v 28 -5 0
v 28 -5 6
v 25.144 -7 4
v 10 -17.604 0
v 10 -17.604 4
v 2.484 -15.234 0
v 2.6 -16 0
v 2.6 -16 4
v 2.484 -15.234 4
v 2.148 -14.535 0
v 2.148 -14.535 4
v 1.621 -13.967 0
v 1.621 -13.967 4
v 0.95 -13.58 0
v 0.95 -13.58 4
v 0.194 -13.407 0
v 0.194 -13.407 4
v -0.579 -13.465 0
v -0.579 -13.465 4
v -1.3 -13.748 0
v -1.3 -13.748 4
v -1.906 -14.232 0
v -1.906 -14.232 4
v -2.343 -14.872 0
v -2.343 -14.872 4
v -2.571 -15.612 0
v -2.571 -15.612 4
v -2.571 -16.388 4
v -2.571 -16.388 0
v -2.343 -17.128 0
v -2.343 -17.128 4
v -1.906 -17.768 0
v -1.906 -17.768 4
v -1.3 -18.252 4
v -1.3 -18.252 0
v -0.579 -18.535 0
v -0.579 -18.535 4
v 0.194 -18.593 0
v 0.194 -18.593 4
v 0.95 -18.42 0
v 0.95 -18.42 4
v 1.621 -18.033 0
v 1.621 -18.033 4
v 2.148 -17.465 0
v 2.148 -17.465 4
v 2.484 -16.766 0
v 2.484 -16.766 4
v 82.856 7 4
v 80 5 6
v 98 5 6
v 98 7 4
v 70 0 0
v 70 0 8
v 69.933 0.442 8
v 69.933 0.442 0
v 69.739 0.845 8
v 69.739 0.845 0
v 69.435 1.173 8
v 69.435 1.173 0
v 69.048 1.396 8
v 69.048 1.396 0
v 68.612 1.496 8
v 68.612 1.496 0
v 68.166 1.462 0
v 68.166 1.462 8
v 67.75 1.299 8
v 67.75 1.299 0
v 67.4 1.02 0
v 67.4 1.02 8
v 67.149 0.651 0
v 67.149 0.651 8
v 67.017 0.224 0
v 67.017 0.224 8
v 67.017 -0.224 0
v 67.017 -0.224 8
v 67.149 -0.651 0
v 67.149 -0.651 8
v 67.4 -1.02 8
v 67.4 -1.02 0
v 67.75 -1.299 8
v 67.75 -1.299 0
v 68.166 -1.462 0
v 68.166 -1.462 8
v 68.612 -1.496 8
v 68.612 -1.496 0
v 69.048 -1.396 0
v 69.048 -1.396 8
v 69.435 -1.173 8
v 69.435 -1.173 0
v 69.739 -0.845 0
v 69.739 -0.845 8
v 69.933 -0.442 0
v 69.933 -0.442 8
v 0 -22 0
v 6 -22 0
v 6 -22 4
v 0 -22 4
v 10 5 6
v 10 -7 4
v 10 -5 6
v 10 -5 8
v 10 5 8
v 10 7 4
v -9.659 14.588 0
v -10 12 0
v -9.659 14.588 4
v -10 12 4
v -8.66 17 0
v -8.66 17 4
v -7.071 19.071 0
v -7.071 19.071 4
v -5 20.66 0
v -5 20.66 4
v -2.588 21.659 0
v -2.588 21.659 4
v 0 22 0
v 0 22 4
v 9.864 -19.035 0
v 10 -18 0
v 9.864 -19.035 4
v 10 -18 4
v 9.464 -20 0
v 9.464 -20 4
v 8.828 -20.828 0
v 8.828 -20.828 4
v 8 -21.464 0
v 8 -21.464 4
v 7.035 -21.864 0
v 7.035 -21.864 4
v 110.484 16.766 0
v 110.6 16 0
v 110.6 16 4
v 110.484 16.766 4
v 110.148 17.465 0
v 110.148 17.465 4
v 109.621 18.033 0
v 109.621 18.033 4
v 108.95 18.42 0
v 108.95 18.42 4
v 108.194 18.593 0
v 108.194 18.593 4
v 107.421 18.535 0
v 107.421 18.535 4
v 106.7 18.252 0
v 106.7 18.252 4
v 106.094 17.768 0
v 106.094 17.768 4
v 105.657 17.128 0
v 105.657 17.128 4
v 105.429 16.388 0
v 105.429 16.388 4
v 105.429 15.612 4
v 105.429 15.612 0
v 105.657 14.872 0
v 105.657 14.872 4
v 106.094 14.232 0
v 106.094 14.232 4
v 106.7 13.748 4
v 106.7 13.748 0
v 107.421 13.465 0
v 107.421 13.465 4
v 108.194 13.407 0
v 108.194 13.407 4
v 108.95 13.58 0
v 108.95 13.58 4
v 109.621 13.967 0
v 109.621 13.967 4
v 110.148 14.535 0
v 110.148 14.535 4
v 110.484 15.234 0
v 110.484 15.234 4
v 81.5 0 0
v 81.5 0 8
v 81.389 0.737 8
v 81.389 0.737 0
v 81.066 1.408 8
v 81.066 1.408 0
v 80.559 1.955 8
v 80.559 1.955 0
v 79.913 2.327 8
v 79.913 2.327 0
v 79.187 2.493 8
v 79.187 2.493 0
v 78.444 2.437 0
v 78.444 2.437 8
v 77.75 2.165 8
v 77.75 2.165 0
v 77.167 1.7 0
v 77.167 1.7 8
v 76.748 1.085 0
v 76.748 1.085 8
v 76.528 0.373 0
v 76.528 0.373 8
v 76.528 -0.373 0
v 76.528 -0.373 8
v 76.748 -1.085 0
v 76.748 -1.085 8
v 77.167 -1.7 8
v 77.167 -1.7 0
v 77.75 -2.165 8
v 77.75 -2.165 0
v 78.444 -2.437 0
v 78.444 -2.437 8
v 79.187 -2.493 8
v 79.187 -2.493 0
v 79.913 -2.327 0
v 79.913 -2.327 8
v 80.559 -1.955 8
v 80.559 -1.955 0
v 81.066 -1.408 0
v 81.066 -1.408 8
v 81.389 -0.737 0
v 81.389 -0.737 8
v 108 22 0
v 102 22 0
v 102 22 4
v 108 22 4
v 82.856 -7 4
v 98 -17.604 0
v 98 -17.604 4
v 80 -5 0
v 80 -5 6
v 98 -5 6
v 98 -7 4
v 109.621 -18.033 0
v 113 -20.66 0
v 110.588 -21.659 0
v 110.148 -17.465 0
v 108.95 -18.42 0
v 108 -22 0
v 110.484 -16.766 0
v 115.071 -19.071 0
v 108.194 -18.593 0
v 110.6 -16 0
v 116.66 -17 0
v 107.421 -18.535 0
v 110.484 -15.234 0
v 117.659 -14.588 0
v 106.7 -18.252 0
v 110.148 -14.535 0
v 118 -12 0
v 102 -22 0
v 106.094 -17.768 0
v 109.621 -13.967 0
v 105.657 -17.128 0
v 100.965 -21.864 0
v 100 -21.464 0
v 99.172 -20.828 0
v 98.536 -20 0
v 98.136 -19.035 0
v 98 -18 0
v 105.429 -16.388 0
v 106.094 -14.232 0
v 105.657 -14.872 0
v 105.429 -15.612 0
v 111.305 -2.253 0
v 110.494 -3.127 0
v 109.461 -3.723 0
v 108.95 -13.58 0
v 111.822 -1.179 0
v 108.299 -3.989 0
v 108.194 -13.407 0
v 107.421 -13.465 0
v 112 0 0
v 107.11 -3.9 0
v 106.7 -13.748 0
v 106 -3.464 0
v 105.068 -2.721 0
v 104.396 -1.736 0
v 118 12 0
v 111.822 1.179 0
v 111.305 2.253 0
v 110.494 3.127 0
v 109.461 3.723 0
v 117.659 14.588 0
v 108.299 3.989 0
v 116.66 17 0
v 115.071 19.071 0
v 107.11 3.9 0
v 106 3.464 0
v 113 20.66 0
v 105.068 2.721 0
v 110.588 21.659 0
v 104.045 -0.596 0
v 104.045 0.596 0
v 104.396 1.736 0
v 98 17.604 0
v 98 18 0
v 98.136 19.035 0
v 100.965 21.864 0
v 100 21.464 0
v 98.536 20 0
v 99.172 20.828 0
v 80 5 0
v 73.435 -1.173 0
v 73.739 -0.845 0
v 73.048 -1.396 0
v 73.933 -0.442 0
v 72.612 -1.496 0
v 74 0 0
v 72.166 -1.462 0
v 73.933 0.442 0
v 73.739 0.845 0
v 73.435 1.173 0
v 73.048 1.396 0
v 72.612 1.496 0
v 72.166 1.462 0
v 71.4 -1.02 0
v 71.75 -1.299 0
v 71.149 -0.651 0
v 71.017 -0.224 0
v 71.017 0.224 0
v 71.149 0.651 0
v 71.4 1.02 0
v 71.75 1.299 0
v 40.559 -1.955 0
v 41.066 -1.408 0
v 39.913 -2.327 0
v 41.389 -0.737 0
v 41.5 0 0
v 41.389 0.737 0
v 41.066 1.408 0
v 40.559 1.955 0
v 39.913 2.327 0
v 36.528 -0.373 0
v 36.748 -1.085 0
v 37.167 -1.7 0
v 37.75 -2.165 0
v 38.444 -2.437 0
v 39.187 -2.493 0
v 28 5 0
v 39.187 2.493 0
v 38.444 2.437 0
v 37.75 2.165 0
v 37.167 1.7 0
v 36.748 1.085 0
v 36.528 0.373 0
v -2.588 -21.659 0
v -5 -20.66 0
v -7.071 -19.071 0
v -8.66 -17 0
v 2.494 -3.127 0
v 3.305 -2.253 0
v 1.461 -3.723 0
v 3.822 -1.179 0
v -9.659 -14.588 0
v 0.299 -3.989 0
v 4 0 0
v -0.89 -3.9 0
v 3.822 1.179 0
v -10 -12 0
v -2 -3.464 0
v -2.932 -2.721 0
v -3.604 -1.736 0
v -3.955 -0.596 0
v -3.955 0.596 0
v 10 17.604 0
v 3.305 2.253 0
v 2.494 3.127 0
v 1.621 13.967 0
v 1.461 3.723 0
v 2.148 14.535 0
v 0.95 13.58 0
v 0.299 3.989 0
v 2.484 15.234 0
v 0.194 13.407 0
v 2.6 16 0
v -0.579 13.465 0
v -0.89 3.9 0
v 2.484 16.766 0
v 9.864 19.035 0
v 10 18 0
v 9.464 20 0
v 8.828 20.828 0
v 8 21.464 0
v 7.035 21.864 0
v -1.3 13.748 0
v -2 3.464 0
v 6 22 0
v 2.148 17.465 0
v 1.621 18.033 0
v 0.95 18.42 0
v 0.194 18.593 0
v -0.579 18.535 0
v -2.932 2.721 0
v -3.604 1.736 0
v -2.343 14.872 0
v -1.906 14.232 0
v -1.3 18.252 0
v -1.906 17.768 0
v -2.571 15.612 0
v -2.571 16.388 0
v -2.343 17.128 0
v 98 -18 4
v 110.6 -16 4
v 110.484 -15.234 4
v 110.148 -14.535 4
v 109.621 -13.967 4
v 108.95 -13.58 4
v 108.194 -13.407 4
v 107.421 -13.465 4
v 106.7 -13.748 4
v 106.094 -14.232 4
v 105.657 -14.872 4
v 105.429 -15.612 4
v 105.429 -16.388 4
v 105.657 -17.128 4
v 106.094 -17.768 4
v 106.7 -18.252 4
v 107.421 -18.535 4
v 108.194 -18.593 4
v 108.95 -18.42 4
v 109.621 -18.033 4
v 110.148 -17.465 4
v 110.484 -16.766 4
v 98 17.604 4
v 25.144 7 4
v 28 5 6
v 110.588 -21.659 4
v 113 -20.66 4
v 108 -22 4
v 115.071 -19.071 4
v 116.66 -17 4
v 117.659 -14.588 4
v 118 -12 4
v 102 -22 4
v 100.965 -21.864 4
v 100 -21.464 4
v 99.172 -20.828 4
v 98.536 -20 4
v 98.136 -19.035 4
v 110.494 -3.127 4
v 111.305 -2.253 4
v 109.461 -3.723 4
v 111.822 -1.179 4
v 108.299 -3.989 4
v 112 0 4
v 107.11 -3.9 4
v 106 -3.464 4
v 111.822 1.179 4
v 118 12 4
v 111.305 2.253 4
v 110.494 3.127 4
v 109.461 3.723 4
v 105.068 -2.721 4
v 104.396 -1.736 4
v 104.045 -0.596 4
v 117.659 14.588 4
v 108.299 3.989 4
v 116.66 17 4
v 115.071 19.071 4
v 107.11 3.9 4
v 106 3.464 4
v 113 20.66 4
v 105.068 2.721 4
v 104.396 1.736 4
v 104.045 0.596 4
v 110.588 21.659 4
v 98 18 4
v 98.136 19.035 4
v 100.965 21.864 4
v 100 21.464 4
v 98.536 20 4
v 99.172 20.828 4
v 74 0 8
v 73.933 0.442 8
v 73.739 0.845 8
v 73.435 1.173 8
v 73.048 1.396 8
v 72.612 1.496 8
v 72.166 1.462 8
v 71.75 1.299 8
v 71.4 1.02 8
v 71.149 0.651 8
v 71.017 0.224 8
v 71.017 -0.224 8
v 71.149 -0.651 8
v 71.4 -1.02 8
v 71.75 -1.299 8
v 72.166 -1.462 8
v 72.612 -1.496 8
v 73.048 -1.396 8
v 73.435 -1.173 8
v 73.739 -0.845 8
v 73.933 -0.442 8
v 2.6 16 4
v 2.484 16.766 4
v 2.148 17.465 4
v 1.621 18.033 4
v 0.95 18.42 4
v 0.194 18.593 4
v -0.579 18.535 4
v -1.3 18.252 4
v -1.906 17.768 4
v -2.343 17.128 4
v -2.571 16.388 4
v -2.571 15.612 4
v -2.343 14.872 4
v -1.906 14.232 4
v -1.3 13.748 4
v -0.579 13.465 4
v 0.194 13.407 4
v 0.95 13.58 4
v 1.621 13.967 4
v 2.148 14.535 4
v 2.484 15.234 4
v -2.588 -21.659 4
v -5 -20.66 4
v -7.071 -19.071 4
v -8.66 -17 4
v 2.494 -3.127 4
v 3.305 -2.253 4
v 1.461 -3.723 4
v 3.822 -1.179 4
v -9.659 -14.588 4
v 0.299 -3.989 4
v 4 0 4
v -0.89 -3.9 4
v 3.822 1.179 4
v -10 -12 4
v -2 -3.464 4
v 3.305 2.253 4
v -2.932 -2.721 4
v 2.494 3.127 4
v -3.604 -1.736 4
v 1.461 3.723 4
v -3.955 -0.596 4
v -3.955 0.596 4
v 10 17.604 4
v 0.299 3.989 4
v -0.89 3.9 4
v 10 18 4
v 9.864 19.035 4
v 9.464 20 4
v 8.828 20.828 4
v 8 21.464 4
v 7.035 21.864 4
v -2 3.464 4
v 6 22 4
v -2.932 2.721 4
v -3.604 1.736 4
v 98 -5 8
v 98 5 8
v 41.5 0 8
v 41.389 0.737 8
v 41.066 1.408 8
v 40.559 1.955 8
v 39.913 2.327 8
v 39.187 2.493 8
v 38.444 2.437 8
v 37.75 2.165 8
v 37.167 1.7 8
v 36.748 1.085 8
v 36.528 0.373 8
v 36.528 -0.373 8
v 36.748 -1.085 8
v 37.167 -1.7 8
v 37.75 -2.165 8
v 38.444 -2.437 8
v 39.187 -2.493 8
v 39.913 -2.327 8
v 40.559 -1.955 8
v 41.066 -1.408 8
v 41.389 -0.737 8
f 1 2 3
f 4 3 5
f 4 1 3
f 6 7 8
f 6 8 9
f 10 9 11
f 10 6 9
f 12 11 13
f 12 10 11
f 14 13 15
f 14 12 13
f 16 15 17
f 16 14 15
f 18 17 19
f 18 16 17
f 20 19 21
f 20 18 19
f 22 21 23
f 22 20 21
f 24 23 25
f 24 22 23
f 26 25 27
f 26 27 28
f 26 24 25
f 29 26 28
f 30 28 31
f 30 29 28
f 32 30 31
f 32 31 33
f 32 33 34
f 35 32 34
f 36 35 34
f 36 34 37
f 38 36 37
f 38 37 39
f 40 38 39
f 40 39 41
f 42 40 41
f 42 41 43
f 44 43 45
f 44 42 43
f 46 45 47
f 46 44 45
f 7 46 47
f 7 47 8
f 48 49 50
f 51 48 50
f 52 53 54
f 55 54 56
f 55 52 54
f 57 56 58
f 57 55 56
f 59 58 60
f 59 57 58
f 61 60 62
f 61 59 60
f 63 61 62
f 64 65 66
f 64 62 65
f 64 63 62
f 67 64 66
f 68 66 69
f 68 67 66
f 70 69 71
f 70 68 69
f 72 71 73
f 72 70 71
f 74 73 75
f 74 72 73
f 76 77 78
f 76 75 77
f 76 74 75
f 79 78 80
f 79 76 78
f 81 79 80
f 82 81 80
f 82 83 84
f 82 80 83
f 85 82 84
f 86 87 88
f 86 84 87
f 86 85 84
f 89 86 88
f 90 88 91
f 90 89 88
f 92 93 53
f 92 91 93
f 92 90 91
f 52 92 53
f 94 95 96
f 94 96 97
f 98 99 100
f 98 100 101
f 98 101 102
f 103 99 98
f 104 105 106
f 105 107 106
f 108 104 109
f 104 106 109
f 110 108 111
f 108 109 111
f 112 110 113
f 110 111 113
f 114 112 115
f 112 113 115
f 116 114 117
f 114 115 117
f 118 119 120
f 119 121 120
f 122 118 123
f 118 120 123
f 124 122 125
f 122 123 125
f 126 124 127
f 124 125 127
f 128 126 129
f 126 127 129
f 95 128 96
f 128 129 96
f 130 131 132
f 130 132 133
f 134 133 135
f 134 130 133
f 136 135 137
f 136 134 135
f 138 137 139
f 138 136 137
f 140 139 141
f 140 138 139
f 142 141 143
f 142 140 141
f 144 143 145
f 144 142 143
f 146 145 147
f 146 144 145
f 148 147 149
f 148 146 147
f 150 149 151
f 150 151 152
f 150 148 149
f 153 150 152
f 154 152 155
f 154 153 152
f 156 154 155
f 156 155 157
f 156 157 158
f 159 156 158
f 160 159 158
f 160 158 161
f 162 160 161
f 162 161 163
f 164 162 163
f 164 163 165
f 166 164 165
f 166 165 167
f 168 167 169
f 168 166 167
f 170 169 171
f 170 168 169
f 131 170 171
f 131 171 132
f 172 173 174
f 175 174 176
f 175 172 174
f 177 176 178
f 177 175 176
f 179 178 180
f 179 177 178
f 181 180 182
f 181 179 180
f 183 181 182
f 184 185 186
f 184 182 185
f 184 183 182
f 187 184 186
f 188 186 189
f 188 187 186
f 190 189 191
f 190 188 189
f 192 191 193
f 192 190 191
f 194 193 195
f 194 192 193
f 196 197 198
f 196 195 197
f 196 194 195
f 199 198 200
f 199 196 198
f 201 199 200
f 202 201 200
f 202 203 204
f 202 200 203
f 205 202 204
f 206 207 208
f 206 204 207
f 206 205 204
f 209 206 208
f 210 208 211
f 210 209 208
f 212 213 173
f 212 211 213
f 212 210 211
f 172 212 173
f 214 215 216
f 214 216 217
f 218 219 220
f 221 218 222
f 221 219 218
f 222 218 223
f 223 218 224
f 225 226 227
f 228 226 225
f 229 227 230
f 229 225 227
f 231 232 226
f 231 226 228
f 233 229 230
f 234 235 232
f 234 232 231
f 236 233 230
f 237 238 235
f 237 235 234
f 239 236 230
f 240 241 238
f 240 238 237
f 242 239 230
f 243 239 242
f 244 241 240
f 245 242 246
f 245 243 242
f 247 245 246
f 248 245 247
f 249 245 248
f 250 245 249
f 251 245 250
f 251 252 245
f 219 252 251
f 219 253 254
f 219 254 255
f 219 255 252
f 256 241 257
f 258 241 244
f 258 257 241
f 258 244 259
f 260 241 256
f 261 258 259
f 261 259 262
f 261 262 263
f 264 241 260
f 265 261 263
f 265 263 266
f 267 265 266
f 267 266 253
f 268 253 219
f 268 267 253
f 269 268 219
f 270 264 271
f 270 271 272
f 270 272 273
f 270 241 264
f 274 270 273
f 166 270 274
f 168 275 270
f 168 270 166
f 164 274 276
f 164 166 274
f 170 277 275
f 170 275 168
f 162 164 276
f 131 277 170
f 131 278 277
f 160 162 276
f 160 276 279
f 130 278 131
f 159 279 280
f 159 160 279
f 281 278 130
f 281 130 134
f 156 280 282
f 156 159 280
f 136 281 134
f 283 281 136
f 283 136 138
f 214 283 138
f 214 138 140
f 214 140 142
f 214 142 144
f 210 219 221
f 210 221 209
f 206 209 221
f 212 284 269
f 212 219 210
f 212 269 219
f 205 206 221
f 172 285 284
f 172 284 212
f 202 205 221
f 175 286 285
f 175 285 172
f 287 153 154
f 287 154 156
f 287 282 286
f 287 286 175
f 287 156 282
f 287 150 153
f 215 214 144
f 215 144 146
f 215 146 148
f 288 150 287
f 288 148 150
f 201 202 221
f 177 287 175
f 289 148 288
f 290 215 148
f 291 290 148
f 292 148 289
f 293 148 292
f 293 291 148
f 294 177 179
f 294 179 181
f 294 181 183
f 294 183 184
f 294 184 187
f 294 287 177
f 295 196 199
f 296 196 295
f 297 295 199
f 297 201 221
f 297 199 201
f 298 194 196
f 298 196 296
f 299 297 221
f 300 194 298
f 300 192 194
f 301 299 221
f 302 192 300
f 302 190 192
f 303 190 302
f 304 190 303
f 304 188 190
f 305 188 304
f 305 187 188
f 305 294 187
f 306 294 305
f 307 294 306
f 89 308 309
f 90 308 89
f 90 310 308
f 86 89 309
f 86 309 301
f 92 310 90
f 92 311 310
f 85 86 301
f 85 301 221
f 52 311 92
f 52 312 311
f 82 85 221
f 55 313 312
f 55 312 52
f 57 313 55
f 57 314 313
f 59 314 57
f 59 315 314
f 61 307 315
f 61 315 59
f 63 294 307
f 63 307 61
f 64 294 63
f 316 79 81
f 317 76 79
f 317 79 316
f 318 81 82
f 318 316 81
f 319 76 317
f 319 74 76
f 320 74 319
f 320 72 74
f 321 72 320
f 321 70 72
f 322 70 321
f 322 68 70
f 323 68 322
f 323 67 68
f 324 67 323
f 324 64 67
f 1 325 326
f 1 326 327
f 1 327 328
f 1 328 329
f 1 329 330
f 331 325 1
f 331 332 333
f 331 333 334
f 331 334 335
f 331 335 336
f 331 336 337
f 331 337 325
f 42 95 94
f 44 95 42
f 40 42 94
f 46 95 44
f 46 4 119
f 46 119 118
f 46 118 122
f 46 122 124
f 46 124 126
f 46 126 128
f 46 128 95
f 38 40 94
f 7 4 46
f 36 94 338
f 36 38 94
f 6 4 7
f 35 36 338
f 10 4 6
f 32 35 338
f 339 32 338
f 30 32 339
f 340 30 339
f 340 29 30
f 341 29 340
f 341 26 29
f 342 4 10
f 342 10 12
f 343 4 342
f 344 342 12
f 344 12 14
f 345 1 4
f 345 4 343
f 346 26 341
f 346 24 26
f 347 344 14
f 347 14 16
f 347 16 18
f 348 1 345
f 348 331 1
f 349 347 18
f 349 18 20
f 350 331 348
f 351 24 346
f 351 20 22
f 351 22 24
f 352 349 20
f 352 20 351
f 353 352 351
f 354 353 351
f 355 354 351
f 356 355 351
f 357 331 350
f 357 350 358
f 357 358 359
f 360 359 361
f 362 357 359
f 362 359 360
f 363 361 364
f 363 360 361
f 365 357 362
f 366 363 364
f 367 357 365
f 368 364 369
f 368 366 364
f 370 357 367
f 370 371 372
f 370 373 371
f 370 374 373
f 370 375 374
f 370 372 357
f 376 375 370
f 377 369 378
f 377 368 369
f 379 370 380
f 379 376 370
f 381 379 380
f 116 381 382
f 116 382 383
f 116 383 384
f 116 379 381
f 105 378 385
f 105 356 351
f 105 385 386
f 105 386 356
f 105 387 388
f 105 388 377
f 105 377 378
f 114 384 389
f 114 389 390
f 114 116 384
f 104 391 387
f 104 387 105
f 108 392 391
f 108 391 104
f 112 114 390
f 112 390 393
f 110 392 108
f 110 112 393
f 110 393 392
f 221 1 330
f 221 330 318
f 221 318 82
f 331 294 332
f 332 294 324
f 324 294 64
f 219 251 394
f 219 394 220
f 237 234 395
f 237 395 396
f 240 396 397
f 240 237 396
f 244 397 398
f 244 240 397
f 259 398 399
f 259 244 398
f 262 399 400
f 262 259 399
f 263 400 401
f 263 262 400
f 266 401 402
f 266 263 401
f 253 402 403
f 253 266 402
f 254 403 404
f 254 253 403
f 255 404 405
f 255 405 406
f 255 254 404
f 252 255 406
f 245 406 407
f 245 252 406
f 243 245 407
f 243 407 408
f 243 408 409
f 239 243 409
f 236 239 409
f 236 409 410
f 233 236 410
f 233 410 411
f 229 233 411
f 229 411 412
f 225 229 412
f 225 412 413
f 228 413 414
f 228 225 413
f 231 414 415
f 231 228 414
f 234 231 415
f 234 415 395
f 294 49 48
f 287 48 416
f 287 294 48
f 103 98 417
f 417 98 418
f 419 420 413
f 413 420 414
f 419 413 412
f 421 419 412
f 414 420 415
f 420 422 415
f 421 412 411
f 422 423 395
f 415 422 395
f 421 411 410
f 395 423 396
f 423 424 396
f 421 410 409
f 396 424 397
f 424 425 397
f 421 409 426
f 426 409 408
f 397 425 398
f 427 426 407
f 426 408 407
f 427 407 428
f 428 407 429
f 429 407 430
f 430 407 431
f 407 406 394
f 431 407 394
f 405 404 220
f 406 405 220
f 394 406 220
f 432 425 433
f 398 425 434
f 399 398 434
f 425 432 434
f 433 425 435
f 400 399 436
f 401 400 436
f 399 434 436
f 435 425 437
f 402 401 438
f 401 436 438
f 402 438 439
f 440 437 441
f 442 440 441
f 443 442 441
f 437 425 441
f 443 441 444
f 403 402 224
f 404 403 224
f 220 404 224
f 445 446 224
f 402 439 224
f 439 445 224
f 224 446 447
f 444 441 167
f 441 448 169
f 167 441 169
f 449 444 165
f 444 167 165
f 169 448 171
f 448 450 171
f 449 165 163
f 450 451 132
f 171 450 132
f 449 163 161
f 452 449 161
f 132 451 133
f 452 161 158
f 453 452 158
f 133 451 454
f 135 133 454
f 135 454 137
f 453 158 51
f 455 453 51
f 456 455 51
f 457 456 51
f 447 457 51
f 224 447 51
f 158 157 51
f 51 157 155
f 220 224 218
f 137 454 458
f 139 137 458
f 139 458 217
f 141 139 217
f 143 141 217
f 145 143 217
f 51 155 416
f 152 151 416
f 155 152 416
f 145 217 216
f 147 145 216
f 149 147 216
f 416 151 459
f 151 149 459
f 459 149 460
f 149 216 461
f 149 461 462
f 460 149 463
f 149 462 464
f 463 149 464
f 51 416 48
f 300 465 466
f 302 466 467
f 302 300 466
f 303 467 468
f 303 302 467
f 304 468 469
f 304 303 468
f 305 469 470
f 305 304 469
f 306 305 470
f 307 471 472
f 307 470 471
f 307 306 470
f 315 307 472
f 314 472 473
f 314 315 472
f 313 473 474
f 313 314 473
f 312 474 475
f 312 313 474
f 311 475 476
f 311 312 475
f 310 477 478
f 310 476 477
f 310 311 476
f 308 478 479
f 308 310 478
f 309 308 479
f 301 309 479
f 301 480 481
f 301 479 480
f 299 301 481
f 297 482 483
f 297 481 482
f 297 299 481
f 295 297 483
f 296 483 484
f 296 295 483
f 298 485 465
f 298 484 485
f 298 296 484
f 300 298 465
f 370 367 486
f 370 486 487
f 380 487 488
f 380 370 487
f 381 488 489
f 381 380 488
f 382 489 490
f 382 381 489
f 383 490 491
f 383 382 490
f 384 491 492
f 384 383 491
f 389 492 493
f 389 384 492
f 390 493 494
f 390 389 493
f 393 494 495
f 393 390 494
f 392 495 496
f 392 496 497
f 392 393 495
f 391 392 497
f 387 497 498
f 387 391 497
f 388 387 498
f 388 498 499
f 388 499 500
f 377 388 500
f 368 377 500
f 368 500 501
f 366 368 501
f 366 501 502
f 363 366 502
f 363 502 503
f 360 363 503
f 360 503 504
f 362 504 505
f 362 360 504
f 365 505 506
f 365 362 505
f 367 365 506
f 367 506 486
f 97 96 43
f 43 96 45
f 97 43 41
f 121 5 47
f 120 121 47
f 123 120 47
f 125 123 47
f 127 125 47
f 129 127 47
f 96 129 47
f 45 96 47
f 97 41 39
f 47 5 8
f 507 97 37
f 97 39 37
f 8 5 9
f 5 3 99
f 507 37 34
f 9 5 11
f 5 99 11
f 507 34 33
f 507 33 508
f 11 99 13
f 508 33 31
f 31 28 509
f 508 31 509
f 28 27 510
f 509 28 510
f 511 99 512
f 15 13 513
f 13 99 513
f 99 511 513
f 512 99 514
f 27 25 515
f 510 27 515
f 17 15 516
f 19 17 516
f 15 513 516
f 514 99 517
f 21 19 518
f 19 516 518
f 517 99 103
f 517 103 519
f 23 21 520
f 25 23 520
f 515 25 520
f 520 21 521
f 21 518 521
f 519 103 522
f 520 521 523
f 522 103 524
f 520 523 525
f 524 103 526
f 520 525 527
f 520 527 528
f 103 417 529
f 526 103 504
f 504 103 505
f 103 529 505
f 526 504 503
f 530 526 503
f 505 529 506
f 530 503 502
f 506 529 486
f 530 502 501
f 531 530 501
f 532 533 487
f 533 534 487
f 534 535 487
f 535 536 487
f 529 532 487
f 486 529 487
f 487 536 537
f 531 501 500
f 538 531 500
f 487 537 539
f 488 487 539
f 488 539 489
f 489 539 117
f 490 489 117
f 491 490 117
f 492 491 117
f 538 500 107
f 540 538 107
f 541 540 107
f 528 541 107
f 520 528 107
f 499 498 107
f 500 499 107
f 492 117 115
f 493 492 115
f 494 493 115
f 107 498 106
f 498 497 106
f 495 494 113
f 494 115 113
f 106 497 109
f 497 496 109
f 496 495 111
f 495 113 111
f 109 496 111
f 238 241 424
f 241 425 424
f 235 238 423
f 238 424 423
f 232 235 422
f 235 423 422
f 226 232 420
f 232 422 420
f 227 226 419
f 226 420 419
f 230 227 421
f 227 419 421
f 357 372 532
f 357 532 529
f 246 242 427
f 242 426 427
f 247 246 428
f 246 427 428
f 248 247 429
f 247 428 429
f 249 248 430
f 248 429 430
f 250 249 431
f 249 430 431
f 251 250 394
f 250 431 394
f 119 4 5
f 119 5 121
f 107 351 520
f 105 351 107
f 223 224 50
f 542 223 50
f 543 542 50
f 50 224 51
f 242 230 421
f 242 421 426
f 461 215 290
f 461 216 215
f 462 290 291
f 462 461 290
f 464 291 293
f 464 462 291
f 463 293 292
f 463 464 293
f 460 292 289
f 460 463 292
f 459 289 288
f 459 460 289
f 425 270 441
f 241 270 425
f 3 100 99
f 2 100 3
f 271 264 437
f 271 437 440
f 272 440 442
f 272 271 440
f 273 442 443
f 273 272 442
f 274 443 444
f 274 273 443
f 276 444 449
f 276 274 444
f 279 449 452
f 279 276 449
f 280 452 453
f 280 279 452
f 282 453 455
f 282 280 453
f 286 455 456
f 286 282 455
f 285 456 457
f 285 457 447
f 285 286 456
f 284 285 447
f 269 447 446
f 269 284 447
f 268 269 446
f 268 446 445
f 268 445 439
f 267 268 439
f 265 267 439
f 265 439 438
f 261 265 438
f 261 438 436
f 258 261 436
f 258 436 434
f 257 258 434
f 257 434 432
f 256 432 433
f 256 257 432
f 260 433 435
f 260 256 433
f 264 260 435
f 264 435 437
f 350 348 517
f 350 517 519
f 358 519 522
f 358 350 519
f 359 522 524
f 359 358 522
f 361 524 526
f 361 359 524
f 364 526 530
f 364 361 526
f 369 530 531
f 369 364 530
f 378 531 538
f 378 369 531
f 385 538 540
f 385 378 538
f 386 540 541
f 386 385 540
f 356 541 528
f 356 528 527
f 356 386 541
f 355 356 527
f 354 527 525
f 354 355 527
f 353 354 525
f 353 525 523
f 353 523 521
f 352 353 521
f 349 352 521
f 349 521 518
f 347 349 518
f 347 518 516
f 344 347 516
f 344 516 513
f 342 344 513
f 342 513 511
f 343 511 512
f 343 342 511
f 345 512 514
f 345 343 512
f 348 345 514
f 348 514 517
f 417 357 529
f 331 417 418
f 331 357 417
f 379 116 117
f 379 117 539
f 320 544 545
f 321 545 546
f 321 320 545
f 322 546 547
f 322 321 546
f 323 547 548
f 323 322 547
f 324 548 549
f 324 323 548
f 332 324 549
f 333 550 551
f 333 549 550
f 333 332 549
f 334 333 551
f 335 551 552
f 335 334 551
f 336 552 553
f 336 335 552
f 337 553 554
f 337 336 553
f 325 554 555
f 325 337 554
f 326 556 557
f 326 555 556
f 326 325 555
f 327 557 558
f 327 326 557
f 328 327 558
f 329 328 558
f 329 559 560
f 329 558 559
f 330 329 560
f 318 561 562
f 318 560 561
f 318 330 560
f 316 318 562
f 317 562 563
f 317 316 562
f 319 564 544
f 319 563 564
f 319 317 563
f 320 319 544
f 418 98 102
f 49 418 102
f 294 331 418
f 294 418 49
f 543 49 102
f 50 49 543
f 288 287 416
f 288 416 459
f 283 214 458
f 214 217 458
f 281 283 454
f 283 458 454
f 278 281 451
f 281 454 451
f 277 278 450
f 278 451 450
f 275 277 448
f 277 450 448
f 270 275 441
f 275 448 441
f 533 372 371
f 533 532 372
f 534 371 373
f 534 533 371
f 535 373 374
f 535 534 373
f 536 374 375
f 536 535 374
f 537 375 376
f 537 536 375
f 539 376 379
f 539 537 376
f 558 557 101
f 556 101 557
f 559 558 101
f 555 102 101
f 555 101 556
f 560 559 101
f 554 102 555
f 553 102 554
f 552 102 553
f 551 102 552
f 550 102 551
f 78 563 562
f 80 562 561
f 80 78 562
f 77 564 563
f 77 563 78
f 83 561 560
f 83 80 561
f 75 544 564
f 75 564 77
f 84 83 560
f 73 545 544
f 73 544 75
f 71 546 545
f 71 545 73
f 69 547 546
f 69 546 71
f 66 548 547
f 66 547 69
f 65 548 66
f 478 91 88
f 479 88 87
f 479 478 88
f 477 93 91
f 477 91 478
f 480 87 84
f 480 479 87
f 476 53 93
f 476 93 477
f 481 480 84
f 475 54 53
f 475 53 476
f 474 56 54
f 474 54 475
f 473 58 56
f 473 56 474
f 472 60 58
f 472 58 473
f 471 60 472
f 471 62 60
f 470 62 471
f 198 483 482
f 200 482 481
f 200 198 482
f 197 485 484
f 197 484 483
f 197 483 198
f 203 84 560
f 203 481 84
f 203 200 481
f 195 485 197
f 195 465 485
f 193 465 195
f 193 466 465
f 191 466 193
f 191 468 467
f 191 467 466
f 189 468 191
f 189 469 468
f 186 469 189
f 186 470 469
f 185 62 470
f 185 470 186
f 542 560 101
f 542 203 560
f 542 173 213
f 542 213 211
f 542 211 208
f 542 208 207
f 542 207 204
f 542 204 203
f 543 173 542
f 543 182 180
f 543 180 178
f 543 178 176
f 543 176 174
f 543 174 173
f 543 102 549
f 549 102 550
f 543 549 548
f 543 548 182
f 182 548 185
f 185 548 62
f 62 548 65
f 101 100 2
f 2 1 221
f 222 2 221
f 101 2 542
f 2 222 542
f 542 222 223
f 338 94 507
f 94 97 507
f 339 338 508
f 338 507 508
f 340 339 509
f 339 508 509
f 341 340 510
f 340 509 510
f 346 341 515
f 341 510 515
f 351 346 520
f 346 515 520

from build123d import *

# Parameters (mm, degrees)
SKETCH_R        = 4
SKETCH_R_2      = 2.5
SKETCH_R_3      = 1.5
SKETCH_R_4      = 2.6
PAD_DEPTH       = 4
SKETCH006_W     = 88
SKETCH006_H     = 10
PAD001_DEPTH    = 4
SKETCH007_R     = 2.5
SKETCH007_R_2   = 1.5
POCKET_DEPTH    = 8.001
FILLET_R        = 10
FILLET001_R     = 10
FILLET002_R     = 4
FILLET003_R     = 4
CHAMFER_SIZE    = 2
CHAMFER001_SIZE = 2
CHAMFER002_SIZE = 2


with BuildPart() as part:
    # Sketch → Pad (new body)
    with BuildSketch(Plane.XY):
        Polygon((80, 5), (98, 17.603736), (98, 22), (118, 22), (118, -22), (98, -22), (98, -17.603736), (80, -5), (28, -5), (10, -17.603736), (10, -22), (-10, -22), (-10, 22), (10, 22), (10, 17.603736), (28, 5), align=None)
        with Locations((108, 0)):
            Circle(SKETCH_R, mode=Mode.SUBTRACT)
        with Locations((39, 0)):
            Circle(SKETCH_R_2, mode=Mode.SUBTRACT)
        with Locations((79, 0)):
            Circle(SKETCH_R_2, mode=Mode.SUBTRACT)
        with Locations((72.5, 0)):
            Circle(SKETCH_R_3, mode=Mode.SUBTRACT)
        with Locations((68.5, 0)):
            Circle(SKETCH_R_3, mode=Mode.SUBTRACT)
        with Locations((108, 16)):
            Circle(SKETCH_R_4, mode=Mode.SUBTRACT)
        with Locations((108, -16)):
            Circle(SKETCH_R_4, mode=Mode.SUBTRACT)
        with Locations((0, 16)):
            Circle(SKETCH_R_4, mode=Mode.SUBTRACT)
        Circle(SKETCH_R, mode=Mode.SUBTRACT)
        with Locations((0, -16)):
            Circle(SKETCH_R_4, mode=Mode.SUBTRACT)
    extrude(amount=PAD_DEPTH)

    # Sketch006 (on Face28 of Pad) → Pad001 (join)
    with BuildSketch(Plane.XY.offset(4)):
        with Locations((54, 0)):
            Rectangle(SKETCH006_W, SKETCH006_H)
    extrude(amount=PAD001_DEPTH)

    # Sketch007 → Pocket (cut, through all)
    with BuildSketch(Plane.XY):
        with Locations((39, 0)):
            Circle(SKETCH007_R)
        with Locations((79, 0)):
            Circle(SKETCH007_R)
        with Locations((72.5, 0)):
            Circle(SKETCH007_R_2)
        with Locations((68.5, 0)):
            Circle(SKETCH007_R_2)
    extrude(amount=POCKET_DEPTH, mode=Mode.SUBTRACT)

    # Fillet
    fillet_edges = [part.edges().sort_by_distance(p)[0] for p in [
        (-10, -22, 2),
        (-10, 22, 2),
    ]]
    fillet(fillet_edges, radius=FILLET_R)

    # Fillet001
    fillet001_edges = [part.edges().sort_by_distance(p)[0] for p in [
        (118, 22, 2),
        (118, -22, 2),
    ]]
    fillet(fillet001_edges, radius=FILLET001_R)

    # Fillet002
    fillet002_edges = [part.edges().sort_by_distance(p)[0] for p in [
        (10, 22, 2),
        (98, 22, 2),
    ]]
    fillet(fillet002_edges, radius=FILLET002_R)

    # Fillet003
    fillet003_edges = [part.edges().sort_by_distance(p)[0] for p in [
        (10, -22, 2),
        (98, -22, 2),
    ]]
    fillet(fillet003_edges, radius=FILLET003_R)

    # Chamfer
    chamfer_edges = [part.edges().sort_by_distance(p)[0] for p in [
        (89, -5, 4),
    ]]
    chamfer(chamfer_edges, length=CHAMFER_SIZE)

    # Chamfer001
    chamfer001_edges = [part.edges().sort_by_distance(p)[0] for p in [
        (19, -5, 4),
    ]]
    chamfer(chamfer001_edges, length=CHAMFER001_SIZE)

    # Chamfer002
    chamfer002_edges = [part.edges().sort_by_distance(p)[0] for p in [
        (19, 5, 4),
        (89, 5, 4),
    ]]
    chamfer(chamfer002_edges, length=CHAMFER002_SIZE)


solid = part.part
